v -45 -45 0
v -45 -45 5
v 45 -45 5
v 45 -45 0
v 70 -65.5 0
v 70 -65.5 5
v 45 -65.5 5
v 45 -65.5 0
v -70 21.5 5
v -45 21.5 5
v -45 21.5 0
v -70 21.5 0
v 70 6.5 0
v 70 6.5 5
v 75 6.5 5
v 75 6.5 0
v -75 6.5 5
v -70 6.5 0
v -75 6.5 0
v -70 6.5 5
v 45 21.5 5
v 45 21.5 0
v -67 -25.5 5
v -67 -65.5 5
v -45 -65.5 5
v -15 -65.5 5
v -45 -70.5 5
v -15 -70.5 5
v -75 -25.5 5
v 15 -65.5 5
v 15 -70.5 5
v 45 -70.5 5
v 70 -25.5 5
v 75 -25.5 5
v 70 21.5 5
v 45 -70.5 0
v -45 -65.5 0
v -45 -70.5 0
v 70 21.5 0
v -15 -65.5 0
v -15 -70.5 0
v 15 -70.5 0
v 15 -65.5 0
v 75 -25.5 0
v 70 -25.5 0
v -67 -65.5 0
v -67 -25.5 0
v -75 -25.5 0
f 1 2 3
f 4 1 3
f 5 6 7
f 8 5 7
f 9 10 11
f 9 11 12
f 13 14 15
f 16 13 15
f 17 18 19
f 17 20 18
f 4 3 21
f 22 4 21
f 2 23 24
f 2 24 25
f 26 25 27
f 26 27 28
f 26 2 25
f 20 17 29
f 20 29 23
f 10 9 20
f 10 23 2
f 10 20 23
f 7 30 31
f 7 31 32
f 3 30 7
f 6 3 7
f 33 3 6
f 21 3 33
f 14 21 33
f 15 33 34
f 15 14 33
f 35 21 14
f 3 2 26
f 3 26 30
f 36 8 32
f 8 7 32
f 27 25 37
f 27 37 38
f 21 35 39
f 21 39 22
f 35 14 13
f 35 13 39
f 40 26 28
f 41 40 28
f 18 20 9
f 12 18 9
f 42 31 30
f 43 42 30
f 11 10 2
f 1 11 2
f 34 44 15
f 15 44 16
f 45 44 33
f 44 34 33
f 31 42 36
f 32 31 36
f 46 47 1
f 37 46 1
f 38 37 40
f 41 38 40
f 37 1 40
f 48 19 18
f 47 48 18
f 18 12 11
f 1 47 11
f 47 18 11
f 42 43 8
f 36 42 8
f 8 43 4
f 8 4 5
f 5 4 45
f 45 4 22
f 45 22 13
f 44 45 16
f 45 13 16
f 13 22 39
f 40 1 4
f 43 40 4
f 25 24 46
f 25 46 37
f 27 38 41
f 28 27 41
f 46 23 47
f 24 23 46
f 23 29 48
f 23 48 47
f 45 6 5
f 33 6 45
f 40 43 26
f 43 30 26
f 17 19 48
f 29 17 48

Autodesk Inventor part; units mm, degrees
ref_plane "YZ Plane" through (0, 0, 0) normal (1, 0, 0) x (0, 1, 0)
ref_plane "XZ Plane" through (0, 0, 0) normal (0, 1, 0) x (-1, 0, 0)
ref_plane "XY Plane" through (0, 0, 0) normal (0, 0, 1) x (1, 0, 0)
sketch "Sketch1" plane through (0, 0, 0) normal (0, 0, 1) x (1, 0, 0)
  line L0 (0, 2.8582) -> (0, -2.8582) construction
  line L1 (-5.7775, 0) -> (5.7775, 0) construction
  line L2 (-75, -70.5) -> (75, -70.5)
  line L3 (75, -70.5) -> (75, 70.5)
  line L4 (75, 70.5) -> (-75, 70.5)
  line L5 (-75, 70.5) -> (-75, -70.5)
  line L6 (-75, -70.5) -> (75, 70.5) construction
  line L7 (75, -70.5) -> (-75, 70.5) construction
  point P0 (0, 0)
  point P1 (0, 0)
  dimension "d0" = 150
  dimension "d1" = 141
extrude "Extrusion1" add sketch "Sketch1" along normal blind 5
sketch "Sketch2" plane through (0, 0, 5) normal (0, 0, 1) x (1, 0, 0)
  line L0 (-75, -70.5) -> (75, -70.5) projected
  line L1 (0, -70.5) -> (-15, -70.5)
  line L2 (-15, -70.5) -> (15, -70.5)
  line L3 (15, -70.5) -> (45, -70.5)
  line L4 (-15, -70.5) -> (-45, -70.5)
  line L5 (-15, -70.5) -> (15, -70.5)
  line L6 (15, -70.5) -> (15, -65.5)
  line L7 (15, -65.5) -> (-15, -65.5)
  line L8 (-15, -65.5) -> (-15, -70.5)
  line L9 (75, -70.5) -> (75, 70.5) projected
  line L10 (45, -70.5) -> (75, -70.5)
  line L11 (75, -70.5) -> (75, -65.5)
  line L12 (75, -65.5) -> (45, -65.5)
  line L13 (45, -65.5) -> (45, -70.5)
  line L14 (-75, 70.5) -> (-75, -70.5) projected
  line L15 (-45, -70.5) -> (-75, -70.5)
  line L16 (-75, -70.5) -> (-75, -65.5)
  line L17 (-75, -65.5) -> (-45, -65.5)
  line L18 (-45, -65.5) -> (-45, -70.5)
  line L19 (75, -70.5) -> (75, -55.5)
  line L20 (75, -55.5) -> (75, -25.5)
  line L21 (75, -25.5) -> (75, 4.5)
  line L22 (75, 4.5) -> (75, 34.5)
  line L23 (75, 34.5) -> (75, 64.5)
  line L24 (75, -25.5) -> (70, -25.5)
  line L25 (70, -25.5) -> (70, 6.5)
  line L26 (70, 6.5) -> (75, 6.5)
  line L27 (75, 6.5) -> (75, -25.5)
  line L28 (75, 70.5) -> (-75, 70.5) projected
  line L29 (75, 34.5) -> (70, 34.5)
  line L30 (70, 34.5) -> (70, 70.5)
  line L31 (70, 70.5) -> (75, 70.5)
  line L32 (75, 70.5) -> (75, 34.5)
  line L33 (-75, -25.5) -> (-70, -25.5)
  line L34 (-70, -25.5) -> (-70, 6.5)
  line L35 (-70, 6.5) -> (-75, 6.5)
  line L36 (-75, 6.5) -> (-75, -25.5)
  line L37 (-75, 34.5) -> (-70, 34.5)
  line L38 (-70, 34.5) -> (-70, 70.5)
  line L39 (-70, 70.5) -> (-75, 70.5)
  line L40 (-75, 70.5) -> (-75, 34.5)
  line L41 (0, 70.5) -> (-15, 70.5)
  line L42 (-15, 70.5) -> (15, 70.5)
  line L43 (15, 70.5) -> (45, 70.5)
  line L44 (-15, 70.5) -> (-45, 70.5)
  line L45 (-75, 70.5) -> (-45, 70.5)
  line L46 (-45, 70.5) -> (-45, 65.5)
  line L47 (-45, 65.5) -> (-75, 65.5)
  line L48 (-75, 65.5) -> (-75, 70.5)
  line L49 (-15, 70.5) -> (15, 70.5)
  line L50 (15, 70.5) -> (15, 65.5)
  line L51 (15, 65.5) -> (-15, 65.5)
  line L52 (-15, 65.5) -> (-15, 70.5)
  line L53 (45, 70.5) -> (75, 70.5)
  line L54 (75, 70.5) -> (75, 65.5)
  line L55 (75, 65.5) -> (45, 65.5)
  line L56 (45, 65.5) -> (45, 70.5)
  line L57 (-75, -25.5) -> (-67, -25.5)
  line L58 (-67, -25.5) -> (-67, -70.5)
  line L59 (-67, -70.5) -> (-75, -70.5)
  line L60 (-75, -70.5) -> (-75, -25.5)
  line L61 (-75, 6.5) -> (-70, 6.5)
  line L62 (-70, 6.5) -> (-70, 34.5)
  line L63 (-70, 34.5) -> (-75, 34.5)
  line L64 (-75, 34.5) -> (-75, 6.5)
  line L65 (70, 34.5) -> (75, 34.5)
  line L66 (75, 34.5) -> (75, 6.5)
  line L67 (75, 6.5) -> (70, 6.5)
  line L68 (70, 6.5) -> (70, 34.5)
  line L69 (70, -25.5) -> (75, -25.5)
  line L70 (75, -25.5) -> (75, -70.5)
  line L71 (75, -70.5) -> (70, -70.5)
  line L72 (70, -70.5) -> (70, -25.5)
  point P0 (0, 0)
  point P1 (-70, 70.5)
  point P2 (70, 65.5)
  point P3 (-70, 65.5)
  point P4 (70, 6.5)
  point P5 (-67, -65.5)
  point P6 (70, -65.5)
  dimension "d4" = 15
  dimension "d5" = 30
  dimension "d6" = 30
  dimension "d7" = 30
  dimension "d8" = 30
  dimension "d9" = 5
  dimension "d10" = 15
  dimension "d11" = 30
  dimension "d12" = 30
  dimension "d13" = 30
  dimension "d14" = 30
  dimension "d15" = 5
  dimension "d16" = 5
  dimension "d17" = 5
  dimension "d24" = 15
  dimension "d25" = 30
  dimension "d26" = 30
  dimension "d27" = 30
  dimension "d28" = 5
extrude "Extrusion2" cut sketch "Sketch2" against normal blind 8 contours L14 L17 L58 L0 | L58 L17 L18 L0 | L14 L33 L57 L58 L17 | L8 L7 L6 L0 | L14 L37 L62 L35 | L14 L28 L38 L47 | L13 L12 L72 L0 | L38 L28 L46 L47 | L72 L12 L9 L0 | L72 L24 L9 L12 | L28 L50 L51 L52 | L68 L29 L9 L26 | L55 L56 L28 L30 | L30 L28 L9 L55
sketch "Sketch3" plane through (0, 0, 5) normal (0, 0, 1) x (1, 0, 0)
  line L0 (-45, -45) -> (45, -45)
  line L1 (45, -45) -> (45, 45)
  line L2 (45, 45) -> (-45, 45)
  line L3 (-45, 45) -> (-45, -45)
  line L4 (-45, -45) -> (45, 45) construction
  line L5 (45, -45) -> (-45, 45) construction
  point P0 (0, 0)
  dimension "d20" = 90
  dimension "d21" = 90
extrude "Extrusion3" cut sketch "Sketch3" against normal blind 8
sketch "Sketch4" plane through (0, 0, 5) normal (0, 0, 1) x (1, 0, 0)
  line L0 (75, 34.5) -> (75, 65.5) projected
  line L1 (75, 65.5) -> (75, 21.5)
  line L2 (75, 21.5) -> (-125.9097, 21.5)
  line L3 (-125.9097, 21.5) -> (-125.9097, 76.2896)
  line L4 (-125.9097, 76.2896) -> (75, 76.2896)
  line L5 (75, 76.2896) -> (75, 21.5)
  point P0 (0, 0)
  dimension "d29" = 44
extrude "Extrusion4" cut sketch "Sketch4" against normal blind 15
properties part number "Plaat achter" material "S235"
